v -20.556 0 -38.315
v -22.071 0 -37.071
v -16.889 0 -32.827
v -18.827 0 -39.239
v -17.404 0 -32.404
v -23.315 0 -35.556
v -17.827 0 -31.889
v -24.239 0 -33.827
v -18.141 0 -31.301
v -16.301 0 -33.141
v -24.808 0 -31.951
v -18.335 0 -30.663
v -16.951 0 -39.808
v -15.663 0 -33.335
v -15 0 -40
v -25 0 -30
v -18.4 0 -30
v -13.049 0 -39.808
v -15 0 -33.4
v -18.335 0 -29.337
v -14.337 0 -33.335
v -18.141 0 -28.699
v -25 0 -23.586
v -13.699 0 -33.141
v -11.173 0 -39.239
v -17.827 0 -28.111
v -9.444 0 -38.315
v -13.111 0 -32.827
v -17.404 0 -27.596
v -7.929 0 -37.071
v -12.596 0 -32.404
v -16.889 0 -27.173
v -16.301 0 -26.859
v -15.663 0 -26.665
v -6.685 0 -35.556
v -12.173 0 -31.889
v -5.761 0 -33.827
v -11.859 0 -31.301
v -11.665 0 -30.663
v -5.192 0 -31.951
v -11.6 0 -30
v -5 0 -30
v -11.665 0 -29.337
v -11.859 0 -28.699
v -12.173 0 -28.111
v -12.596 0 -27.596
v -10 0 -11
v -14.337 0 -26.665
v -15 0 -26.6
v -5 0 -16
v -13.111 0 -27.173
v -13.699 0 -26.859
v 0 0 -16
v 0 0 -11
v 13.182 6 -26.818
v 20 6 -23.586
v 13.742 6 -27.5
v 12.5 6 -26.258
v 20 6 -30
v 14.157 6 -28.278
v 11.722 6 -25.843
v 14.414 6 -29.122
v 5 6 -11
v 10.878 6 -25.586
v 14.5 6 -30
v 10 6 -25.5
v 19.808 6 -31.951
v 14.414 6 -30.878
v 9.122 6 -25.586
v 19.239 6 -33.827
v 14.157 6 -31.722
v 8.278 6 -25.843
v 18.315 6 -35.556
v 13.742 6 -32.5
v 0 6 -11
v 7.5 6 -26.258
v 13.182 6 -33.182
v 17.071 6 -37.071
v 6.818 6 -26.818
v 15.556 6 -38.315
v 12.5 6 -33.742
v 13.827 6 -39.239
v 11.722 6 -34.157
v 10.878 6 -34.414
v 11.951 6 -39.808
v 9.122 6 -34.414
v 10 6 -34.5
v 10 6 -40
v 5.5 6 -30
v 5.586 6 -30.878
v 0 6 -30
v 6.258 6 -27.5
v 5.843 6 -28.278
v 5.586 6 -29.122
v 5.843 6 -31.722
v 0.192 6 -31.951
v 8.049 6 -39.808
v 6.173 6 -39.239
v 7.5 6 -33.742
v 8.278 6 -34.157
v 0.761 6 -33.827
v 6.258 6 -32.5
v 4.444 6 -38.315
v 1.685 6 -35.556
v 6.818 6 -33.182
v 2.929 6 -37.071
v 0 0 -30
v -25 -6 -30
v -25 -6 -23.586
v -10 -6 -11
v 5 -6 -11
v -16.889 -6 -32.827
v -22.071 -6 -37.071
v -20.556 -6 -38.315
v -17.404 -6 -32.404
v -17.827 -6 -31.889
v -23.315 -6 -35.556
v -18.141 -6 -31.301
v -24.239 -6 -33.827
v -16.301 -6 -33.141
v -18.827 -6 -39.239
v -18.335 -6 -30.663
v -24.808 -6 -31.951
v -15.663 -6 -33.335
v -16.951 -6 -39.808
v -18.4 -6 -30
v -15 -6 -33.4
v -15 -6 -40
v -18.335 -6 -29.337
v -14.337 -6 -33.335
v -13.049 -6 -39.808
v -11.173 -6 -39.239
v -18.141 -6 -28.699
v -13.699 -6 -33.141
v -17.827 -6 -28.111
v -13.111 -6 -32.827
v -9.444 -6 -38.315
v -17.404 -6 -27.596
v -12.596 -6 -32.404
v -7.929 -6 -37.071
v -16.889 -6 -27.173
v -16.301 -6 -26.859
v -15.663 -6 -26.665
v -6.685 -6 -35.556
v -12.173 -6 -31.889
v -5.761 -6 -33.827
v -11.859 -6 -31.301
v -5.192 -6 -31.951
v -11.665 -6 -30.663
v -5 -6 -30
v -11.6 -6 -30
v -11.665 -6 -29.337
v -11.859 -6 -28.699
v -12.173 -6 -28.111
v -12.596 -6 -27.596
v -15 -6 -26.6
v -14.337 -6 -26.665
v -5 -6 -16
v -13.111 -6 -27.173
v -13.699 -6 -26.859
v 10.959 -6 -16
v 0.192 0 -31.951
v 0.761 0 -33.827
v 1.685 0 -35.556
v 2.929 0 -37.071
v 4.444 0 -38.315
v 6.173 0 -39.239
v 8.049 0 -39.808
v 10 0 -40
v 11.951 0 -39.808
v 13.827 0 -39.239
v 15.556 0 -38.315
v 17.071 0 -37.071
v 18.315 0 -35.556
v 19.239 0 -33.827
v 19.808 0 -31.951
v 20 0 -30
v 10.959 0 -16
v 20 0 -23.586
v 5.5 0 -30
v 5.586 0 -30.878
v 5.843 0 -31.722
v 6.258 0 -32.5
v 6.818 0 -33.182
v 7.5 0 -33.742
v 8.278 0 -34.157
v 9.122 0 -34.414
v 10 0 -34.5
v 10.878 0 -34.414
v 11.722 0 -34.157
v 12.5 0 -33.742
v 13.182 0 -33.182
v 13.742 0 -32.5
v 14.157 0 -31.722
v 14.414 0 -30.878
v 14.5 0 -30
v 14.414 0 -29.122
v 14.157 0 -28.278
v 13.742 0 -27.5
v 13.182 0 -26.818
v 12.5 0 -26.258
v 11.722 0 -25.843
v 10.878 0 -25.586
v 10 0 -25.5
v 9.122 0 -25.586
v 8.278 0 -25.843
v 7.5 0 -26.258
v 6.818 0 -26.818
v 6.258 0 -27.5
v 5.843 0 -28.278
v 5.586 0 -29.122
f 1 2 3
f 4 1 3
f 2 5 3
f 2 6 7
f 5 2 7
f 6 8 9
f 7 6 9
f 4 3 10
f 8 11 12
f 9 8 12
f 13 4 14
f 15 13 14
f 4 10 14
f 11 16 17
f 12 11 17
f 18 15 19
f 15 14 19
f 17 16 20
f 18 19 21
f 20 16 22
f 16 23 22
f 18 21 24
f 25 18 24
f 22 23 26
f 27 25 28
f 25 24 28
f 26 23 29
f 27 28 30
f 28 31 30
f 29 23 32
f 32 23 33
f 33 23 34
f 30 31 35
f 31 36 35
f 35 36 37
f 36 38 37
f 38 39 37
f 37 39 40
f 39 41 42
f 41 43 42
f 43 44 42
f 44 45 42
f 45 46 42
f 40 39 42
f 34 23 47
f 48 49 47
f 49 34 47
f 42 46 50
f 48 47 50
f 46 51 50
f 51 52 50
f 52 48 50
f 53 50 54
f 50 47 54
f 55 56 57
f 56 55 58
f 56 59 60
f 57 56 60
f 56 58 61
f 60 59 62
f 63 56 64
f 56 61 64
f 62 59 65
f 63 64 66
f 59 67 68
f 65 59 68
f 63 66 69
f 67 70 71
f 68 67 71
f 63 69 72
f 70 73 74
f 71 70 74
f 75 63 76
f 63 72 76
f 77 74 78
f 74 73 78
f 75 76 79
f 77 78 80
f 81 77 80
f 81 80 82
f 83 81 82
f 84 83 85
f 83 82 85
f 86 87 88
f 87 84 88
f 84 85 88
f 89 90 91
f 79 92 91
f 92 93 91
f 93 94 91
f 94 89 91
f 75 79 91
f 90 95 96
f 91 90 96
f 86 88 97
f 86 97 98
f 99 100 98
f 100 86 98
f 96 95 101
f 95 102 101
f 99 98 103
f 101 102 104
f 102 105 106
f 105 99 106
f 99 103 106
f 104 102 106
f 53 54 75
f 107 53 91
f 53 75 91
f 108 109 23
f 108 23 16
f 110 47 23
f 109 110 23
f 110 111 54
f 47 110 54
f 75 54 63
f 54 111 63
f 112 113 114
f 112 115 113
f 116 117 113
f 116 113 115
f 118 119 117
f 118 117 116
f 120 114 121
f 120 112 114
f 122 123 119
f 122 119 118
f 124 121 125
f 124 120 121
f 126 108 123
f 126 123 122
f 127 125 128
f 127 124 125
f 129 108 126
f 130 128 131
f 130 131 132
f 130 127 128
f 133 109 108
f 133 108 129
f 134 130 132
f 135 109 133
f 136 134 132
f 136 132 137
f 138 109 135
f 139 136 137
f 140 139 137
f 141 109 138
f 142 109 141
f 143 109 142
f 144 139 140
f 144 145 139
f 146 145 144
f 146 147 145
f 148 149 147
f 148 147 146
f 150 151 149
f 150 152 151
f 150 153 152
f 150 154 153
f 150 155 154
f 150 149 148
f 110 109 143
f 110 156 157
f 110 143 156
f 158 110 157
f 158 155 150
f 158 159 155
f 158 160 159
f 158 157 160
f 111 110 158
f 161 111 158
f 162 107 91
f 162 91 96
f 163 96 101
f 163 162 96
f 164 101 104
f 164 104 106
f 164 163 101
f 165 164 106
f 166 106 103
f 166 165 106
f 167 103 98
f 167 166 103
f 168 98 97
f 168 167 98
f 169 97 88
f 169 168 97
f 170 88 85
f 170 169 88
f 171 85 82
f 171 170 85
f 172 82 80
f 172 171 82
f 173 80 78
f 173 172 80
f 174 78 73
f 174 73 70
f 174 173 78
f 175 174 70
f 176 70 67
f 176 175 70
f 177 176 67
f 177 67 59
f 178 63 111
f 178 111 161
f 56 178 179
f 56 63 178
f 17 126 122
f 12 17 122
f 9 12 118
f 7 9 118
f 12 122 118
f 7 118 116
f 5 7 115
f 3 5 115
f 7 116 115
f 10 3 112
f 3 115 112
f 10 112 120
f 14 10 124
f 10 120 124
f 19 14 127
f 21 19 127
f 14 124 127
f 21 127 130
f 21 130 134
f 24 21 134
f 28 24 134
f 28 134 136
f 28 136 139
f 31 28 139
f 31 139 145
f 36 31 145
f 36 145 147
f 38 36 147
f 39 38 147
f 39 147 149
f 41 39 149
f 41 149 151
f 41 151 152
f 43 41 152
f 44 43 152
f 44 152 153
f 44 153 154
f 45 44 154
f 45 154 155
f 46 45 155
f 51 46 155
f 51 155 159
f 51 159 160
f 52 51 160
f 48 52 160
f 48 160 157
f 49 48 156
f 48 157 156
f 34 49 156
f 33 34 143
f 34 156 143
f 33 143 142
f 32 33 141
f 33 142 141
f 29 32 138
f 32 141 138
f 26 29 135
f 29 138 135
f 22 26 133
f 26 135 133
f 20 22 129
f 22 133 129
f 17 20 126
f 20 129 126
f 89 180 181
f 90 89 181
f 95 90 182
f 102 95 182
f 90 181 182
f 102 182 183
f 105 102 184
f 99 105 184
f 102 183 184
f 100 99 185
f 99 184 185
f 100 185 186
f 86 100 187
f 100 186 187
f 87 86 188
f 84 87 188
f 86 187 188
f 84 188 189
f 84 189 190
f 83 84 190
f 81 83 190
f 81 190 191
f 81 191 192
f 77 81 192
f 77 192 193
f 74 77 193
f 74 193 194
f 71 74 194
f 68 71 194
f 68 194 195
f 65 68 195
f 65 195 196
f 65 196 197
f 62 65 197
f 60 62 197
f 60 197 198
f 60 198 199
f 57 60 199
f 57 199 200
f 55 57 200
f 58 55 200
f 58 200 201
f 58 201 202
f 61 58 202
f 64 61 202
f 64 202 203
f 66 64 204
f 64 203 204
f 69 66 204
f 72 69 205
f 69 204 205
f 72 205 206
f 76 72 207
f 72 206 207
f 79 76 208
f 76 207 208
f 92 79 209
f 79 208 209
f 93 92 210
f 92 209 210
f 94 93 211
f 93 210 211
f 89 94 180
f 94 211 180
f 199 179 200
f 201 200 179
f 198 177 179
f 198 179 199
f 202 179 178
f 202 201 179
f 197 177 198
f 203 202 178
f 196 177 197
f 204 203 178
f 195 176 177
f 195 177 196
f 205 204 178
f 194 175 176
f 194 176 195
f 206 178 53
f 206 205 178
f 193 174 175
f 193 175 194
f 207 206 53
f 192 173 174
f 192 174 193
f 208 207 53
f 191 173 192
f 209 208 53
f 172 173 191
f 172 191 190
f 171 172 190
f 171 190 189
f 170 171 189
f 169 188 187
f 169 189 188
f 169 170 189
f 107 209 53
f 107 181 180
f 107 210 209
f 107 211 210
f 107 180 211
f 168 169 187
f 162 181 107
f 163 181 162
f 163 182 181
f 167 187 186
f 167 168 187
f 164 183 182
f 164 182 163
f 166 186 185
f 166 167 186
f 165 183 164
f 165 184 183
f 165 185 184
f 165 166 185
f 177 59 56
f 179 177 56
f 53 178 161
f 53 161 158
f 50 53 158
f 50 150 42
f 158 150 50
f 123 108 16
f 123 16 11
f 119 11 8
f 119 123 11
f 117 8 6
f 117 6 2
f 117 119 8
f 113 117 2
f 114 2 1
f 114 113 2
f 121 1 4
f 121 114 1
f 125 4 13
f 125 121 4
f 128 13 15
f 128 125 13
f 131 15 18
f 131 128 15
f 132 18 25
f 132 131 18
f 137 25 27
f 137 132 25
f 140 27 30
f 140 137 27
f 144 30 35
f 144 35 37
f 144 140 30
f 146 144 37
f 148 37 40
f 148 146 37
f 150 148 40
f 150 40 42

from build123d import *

# Parameters (mm, degrees)
BOSS_EXTRU_1_DEPTH      = 6
BOSS_EXTRU_2_DEPTH      = 12
ESQUISSE14_W            = 21
ESQUISSE14_H            = 6
ENL_V_MAT_EXTRU_2_DEPTH = 21
D_GAGEMENT_M81_D        = 9
TROU_TARAUD_M82_D       = 6.8
ESQUISSE19_W            = 31.228123836
ESQUISSE19_H            = 16.033363116
ENL_V_MAT_EXTRU_3_DEPTH = 22
ESQUISSE20_W            = 8
ESQUISSE20_H            = 6
BOSS_EXTRU_3_DEPTH      = 25
BOSS_EXTRU_4_DEPTH      = 6
TROU_TARAUD_M83_D       = 6.8
ESQUISSE25_W            = 25
ESQUISSE25_H            = 6
ENL_V_MAT_EXTRU_4_DEPTH = 3
ENL_V_START             = -13
ENL_V_MAT_EXTRU_5_DEPTH = 14


with BuildPart() as part:
    # Esquisse1 → Boss.-Extru.1 (new body)
    with BuildSketch(Plane(origin=(0, 0, 0), x_dir=(1, 0, 0), z_dir=(0, 1, 0))):
        with BuildLine():
            Line((0, 0), (0, 30))
            ThreePointArc((0, 30), (10, 40), (20, 30))
            Line((20, 30), (20, 0))
            ThreePointArc((20, 0), (10, -10), (0, 0))
        make_face()
    extrude(amount=BOSS_EXTRU_1_DEPTH)

    # Esquisse12 → Boss.-Extru.2 (add)
    with BuildSketch(Plane.XZ):
        with BuildLine():
            Line((0, -30), (20, -30))
            Line((20, -30), (20, 0))
            ThreePointArc((20, 0), (10, 10), (0, 0))
            Line((0, 0), (0, -30))
        make_face()
    extrude(amount=BOSS_EXTRU_2_DEPTH)

    # Esquisse14 → Enlèv. mat.-Extru.2 (cut, through all)
    with BuildSketch(Plane(origin=(20, 0, 0), x_dir=(0, 0, -1), z_dir=(1, 0, 0))):
        with Locations((0.5, 3)):
            Rectangle(ESQUISSE14_W, ESQUISSE14_H)
        Polygon((30, 0), (19, 0), (19, -6), (-10, -6), (-10, -12), (30, -12), align=None)
    extrude(amount=-ENL_V_MAT_EXTRU_2_DEPTH, mode=Mode.SUBTRACT)

    # Dégagement M81 (through all)
    with Locations(Plane(origin=(0, 6, 0), x_dir=(1, 0, 0), z_dir=(0, 1, 0))):
        with Locations((10, 30)):
            Hole(D_GAGEMENT_M81_D / 2)

    # Trou taraudé M82 (through all)
    with Locations(Plane(origin=(0, 0, 0), x_dir=(1, 0, 0), z_dir=(0, 1, 0))):
        with Locations((10, 0)):
            Hole(TROU_TARAUD_M82_D / 2)

    # Esquisse19 → Enlèv. mat.-Extru.3 (cut, through all)
    with BuildSketch(Plane.XY.offset(-11)):
        with Locations((8.695037224, -0.70266631)):
            Rectangle(ESQUISSE19_W, ESQUISSE19_H)
    extrude(amount=ENL_V_MAT_EXTRU_3_DEPTH, mode=Mode.SUBTRACT)

    # Esquisse20 → Boss.-Extru.3 (add)
    with BuildSketch(Plane.ZY):
        with Locations((-15, -3)):
            Rectangle(ESQUISSE20_W, ESQUISSE20_H)
    extrude(amount=BOSS_EXTRU_3_DEPTH)

    # Esquisse21 → Boss.-Extru.4 (add)
    with BuildSketch(Plane.XZ.offset(6)):
        with BuildLine():
            Line((-25, -19), (-25, -30))
            ThreePointArc((-25, -30), (-15, -40), (-5, -30))
            Line((-5, -30), (-5, -19))
            Line((-5, -19), (-25, -19))
        make_face()
    extrude(amount=-BOSS_EXTRU_4_DEPTH)

    # Trou taraudé M83 (through all)
    with Locations(Plane(origin=(0, 0, 0), x_dir=(1, 0, 0), z_dir=(0, 1, 0))):
        with Locations((-15, 30)):
            Hole(TROU_TARAUD_M83_D / 2)

    # Esquisse25 → Enlèv. mat.-Extru.4 (cut)
    with BuildSketch(Plane(origin=(0, 0, -19), x_dir=(-1, 0, 0), z_dir=(0, 0, -1))):
        with Locations((-7.5, -3)):
            Rectangle(ESQUISSE25_W, ESQUISSE25_H)
    extrude(amount=-ENL_V_MAT_EXTRU_4_DEPTH, mode=Mode.SUBTRACT)

    # Esquisse27 → Enlèv. mat.-Extru.5 (cut)
    with BuildSketch(Plane.XZ.offset(6).offset(ENL_V_START)):
        Polygon((-25, -11), (-10, -11), (-25, -23.586494468), align=None)
    enl_v_mat_extru_5 = extrude(amount=ENL_V_MAT_EXTRU_5_DEPTH, mode=Mode.SUBTRACT)

    # Symétrie1: Enlèv. mat.-Extru.5 across plane
    add(enl_v_mat_extru_5.mirror(Plane(origin=(-2.5, 0, 0), x_dir=(0, 0, 1), z_dir=(1, 0, 0))), mode=Mode.SUBTRACT)


solid = part.part
